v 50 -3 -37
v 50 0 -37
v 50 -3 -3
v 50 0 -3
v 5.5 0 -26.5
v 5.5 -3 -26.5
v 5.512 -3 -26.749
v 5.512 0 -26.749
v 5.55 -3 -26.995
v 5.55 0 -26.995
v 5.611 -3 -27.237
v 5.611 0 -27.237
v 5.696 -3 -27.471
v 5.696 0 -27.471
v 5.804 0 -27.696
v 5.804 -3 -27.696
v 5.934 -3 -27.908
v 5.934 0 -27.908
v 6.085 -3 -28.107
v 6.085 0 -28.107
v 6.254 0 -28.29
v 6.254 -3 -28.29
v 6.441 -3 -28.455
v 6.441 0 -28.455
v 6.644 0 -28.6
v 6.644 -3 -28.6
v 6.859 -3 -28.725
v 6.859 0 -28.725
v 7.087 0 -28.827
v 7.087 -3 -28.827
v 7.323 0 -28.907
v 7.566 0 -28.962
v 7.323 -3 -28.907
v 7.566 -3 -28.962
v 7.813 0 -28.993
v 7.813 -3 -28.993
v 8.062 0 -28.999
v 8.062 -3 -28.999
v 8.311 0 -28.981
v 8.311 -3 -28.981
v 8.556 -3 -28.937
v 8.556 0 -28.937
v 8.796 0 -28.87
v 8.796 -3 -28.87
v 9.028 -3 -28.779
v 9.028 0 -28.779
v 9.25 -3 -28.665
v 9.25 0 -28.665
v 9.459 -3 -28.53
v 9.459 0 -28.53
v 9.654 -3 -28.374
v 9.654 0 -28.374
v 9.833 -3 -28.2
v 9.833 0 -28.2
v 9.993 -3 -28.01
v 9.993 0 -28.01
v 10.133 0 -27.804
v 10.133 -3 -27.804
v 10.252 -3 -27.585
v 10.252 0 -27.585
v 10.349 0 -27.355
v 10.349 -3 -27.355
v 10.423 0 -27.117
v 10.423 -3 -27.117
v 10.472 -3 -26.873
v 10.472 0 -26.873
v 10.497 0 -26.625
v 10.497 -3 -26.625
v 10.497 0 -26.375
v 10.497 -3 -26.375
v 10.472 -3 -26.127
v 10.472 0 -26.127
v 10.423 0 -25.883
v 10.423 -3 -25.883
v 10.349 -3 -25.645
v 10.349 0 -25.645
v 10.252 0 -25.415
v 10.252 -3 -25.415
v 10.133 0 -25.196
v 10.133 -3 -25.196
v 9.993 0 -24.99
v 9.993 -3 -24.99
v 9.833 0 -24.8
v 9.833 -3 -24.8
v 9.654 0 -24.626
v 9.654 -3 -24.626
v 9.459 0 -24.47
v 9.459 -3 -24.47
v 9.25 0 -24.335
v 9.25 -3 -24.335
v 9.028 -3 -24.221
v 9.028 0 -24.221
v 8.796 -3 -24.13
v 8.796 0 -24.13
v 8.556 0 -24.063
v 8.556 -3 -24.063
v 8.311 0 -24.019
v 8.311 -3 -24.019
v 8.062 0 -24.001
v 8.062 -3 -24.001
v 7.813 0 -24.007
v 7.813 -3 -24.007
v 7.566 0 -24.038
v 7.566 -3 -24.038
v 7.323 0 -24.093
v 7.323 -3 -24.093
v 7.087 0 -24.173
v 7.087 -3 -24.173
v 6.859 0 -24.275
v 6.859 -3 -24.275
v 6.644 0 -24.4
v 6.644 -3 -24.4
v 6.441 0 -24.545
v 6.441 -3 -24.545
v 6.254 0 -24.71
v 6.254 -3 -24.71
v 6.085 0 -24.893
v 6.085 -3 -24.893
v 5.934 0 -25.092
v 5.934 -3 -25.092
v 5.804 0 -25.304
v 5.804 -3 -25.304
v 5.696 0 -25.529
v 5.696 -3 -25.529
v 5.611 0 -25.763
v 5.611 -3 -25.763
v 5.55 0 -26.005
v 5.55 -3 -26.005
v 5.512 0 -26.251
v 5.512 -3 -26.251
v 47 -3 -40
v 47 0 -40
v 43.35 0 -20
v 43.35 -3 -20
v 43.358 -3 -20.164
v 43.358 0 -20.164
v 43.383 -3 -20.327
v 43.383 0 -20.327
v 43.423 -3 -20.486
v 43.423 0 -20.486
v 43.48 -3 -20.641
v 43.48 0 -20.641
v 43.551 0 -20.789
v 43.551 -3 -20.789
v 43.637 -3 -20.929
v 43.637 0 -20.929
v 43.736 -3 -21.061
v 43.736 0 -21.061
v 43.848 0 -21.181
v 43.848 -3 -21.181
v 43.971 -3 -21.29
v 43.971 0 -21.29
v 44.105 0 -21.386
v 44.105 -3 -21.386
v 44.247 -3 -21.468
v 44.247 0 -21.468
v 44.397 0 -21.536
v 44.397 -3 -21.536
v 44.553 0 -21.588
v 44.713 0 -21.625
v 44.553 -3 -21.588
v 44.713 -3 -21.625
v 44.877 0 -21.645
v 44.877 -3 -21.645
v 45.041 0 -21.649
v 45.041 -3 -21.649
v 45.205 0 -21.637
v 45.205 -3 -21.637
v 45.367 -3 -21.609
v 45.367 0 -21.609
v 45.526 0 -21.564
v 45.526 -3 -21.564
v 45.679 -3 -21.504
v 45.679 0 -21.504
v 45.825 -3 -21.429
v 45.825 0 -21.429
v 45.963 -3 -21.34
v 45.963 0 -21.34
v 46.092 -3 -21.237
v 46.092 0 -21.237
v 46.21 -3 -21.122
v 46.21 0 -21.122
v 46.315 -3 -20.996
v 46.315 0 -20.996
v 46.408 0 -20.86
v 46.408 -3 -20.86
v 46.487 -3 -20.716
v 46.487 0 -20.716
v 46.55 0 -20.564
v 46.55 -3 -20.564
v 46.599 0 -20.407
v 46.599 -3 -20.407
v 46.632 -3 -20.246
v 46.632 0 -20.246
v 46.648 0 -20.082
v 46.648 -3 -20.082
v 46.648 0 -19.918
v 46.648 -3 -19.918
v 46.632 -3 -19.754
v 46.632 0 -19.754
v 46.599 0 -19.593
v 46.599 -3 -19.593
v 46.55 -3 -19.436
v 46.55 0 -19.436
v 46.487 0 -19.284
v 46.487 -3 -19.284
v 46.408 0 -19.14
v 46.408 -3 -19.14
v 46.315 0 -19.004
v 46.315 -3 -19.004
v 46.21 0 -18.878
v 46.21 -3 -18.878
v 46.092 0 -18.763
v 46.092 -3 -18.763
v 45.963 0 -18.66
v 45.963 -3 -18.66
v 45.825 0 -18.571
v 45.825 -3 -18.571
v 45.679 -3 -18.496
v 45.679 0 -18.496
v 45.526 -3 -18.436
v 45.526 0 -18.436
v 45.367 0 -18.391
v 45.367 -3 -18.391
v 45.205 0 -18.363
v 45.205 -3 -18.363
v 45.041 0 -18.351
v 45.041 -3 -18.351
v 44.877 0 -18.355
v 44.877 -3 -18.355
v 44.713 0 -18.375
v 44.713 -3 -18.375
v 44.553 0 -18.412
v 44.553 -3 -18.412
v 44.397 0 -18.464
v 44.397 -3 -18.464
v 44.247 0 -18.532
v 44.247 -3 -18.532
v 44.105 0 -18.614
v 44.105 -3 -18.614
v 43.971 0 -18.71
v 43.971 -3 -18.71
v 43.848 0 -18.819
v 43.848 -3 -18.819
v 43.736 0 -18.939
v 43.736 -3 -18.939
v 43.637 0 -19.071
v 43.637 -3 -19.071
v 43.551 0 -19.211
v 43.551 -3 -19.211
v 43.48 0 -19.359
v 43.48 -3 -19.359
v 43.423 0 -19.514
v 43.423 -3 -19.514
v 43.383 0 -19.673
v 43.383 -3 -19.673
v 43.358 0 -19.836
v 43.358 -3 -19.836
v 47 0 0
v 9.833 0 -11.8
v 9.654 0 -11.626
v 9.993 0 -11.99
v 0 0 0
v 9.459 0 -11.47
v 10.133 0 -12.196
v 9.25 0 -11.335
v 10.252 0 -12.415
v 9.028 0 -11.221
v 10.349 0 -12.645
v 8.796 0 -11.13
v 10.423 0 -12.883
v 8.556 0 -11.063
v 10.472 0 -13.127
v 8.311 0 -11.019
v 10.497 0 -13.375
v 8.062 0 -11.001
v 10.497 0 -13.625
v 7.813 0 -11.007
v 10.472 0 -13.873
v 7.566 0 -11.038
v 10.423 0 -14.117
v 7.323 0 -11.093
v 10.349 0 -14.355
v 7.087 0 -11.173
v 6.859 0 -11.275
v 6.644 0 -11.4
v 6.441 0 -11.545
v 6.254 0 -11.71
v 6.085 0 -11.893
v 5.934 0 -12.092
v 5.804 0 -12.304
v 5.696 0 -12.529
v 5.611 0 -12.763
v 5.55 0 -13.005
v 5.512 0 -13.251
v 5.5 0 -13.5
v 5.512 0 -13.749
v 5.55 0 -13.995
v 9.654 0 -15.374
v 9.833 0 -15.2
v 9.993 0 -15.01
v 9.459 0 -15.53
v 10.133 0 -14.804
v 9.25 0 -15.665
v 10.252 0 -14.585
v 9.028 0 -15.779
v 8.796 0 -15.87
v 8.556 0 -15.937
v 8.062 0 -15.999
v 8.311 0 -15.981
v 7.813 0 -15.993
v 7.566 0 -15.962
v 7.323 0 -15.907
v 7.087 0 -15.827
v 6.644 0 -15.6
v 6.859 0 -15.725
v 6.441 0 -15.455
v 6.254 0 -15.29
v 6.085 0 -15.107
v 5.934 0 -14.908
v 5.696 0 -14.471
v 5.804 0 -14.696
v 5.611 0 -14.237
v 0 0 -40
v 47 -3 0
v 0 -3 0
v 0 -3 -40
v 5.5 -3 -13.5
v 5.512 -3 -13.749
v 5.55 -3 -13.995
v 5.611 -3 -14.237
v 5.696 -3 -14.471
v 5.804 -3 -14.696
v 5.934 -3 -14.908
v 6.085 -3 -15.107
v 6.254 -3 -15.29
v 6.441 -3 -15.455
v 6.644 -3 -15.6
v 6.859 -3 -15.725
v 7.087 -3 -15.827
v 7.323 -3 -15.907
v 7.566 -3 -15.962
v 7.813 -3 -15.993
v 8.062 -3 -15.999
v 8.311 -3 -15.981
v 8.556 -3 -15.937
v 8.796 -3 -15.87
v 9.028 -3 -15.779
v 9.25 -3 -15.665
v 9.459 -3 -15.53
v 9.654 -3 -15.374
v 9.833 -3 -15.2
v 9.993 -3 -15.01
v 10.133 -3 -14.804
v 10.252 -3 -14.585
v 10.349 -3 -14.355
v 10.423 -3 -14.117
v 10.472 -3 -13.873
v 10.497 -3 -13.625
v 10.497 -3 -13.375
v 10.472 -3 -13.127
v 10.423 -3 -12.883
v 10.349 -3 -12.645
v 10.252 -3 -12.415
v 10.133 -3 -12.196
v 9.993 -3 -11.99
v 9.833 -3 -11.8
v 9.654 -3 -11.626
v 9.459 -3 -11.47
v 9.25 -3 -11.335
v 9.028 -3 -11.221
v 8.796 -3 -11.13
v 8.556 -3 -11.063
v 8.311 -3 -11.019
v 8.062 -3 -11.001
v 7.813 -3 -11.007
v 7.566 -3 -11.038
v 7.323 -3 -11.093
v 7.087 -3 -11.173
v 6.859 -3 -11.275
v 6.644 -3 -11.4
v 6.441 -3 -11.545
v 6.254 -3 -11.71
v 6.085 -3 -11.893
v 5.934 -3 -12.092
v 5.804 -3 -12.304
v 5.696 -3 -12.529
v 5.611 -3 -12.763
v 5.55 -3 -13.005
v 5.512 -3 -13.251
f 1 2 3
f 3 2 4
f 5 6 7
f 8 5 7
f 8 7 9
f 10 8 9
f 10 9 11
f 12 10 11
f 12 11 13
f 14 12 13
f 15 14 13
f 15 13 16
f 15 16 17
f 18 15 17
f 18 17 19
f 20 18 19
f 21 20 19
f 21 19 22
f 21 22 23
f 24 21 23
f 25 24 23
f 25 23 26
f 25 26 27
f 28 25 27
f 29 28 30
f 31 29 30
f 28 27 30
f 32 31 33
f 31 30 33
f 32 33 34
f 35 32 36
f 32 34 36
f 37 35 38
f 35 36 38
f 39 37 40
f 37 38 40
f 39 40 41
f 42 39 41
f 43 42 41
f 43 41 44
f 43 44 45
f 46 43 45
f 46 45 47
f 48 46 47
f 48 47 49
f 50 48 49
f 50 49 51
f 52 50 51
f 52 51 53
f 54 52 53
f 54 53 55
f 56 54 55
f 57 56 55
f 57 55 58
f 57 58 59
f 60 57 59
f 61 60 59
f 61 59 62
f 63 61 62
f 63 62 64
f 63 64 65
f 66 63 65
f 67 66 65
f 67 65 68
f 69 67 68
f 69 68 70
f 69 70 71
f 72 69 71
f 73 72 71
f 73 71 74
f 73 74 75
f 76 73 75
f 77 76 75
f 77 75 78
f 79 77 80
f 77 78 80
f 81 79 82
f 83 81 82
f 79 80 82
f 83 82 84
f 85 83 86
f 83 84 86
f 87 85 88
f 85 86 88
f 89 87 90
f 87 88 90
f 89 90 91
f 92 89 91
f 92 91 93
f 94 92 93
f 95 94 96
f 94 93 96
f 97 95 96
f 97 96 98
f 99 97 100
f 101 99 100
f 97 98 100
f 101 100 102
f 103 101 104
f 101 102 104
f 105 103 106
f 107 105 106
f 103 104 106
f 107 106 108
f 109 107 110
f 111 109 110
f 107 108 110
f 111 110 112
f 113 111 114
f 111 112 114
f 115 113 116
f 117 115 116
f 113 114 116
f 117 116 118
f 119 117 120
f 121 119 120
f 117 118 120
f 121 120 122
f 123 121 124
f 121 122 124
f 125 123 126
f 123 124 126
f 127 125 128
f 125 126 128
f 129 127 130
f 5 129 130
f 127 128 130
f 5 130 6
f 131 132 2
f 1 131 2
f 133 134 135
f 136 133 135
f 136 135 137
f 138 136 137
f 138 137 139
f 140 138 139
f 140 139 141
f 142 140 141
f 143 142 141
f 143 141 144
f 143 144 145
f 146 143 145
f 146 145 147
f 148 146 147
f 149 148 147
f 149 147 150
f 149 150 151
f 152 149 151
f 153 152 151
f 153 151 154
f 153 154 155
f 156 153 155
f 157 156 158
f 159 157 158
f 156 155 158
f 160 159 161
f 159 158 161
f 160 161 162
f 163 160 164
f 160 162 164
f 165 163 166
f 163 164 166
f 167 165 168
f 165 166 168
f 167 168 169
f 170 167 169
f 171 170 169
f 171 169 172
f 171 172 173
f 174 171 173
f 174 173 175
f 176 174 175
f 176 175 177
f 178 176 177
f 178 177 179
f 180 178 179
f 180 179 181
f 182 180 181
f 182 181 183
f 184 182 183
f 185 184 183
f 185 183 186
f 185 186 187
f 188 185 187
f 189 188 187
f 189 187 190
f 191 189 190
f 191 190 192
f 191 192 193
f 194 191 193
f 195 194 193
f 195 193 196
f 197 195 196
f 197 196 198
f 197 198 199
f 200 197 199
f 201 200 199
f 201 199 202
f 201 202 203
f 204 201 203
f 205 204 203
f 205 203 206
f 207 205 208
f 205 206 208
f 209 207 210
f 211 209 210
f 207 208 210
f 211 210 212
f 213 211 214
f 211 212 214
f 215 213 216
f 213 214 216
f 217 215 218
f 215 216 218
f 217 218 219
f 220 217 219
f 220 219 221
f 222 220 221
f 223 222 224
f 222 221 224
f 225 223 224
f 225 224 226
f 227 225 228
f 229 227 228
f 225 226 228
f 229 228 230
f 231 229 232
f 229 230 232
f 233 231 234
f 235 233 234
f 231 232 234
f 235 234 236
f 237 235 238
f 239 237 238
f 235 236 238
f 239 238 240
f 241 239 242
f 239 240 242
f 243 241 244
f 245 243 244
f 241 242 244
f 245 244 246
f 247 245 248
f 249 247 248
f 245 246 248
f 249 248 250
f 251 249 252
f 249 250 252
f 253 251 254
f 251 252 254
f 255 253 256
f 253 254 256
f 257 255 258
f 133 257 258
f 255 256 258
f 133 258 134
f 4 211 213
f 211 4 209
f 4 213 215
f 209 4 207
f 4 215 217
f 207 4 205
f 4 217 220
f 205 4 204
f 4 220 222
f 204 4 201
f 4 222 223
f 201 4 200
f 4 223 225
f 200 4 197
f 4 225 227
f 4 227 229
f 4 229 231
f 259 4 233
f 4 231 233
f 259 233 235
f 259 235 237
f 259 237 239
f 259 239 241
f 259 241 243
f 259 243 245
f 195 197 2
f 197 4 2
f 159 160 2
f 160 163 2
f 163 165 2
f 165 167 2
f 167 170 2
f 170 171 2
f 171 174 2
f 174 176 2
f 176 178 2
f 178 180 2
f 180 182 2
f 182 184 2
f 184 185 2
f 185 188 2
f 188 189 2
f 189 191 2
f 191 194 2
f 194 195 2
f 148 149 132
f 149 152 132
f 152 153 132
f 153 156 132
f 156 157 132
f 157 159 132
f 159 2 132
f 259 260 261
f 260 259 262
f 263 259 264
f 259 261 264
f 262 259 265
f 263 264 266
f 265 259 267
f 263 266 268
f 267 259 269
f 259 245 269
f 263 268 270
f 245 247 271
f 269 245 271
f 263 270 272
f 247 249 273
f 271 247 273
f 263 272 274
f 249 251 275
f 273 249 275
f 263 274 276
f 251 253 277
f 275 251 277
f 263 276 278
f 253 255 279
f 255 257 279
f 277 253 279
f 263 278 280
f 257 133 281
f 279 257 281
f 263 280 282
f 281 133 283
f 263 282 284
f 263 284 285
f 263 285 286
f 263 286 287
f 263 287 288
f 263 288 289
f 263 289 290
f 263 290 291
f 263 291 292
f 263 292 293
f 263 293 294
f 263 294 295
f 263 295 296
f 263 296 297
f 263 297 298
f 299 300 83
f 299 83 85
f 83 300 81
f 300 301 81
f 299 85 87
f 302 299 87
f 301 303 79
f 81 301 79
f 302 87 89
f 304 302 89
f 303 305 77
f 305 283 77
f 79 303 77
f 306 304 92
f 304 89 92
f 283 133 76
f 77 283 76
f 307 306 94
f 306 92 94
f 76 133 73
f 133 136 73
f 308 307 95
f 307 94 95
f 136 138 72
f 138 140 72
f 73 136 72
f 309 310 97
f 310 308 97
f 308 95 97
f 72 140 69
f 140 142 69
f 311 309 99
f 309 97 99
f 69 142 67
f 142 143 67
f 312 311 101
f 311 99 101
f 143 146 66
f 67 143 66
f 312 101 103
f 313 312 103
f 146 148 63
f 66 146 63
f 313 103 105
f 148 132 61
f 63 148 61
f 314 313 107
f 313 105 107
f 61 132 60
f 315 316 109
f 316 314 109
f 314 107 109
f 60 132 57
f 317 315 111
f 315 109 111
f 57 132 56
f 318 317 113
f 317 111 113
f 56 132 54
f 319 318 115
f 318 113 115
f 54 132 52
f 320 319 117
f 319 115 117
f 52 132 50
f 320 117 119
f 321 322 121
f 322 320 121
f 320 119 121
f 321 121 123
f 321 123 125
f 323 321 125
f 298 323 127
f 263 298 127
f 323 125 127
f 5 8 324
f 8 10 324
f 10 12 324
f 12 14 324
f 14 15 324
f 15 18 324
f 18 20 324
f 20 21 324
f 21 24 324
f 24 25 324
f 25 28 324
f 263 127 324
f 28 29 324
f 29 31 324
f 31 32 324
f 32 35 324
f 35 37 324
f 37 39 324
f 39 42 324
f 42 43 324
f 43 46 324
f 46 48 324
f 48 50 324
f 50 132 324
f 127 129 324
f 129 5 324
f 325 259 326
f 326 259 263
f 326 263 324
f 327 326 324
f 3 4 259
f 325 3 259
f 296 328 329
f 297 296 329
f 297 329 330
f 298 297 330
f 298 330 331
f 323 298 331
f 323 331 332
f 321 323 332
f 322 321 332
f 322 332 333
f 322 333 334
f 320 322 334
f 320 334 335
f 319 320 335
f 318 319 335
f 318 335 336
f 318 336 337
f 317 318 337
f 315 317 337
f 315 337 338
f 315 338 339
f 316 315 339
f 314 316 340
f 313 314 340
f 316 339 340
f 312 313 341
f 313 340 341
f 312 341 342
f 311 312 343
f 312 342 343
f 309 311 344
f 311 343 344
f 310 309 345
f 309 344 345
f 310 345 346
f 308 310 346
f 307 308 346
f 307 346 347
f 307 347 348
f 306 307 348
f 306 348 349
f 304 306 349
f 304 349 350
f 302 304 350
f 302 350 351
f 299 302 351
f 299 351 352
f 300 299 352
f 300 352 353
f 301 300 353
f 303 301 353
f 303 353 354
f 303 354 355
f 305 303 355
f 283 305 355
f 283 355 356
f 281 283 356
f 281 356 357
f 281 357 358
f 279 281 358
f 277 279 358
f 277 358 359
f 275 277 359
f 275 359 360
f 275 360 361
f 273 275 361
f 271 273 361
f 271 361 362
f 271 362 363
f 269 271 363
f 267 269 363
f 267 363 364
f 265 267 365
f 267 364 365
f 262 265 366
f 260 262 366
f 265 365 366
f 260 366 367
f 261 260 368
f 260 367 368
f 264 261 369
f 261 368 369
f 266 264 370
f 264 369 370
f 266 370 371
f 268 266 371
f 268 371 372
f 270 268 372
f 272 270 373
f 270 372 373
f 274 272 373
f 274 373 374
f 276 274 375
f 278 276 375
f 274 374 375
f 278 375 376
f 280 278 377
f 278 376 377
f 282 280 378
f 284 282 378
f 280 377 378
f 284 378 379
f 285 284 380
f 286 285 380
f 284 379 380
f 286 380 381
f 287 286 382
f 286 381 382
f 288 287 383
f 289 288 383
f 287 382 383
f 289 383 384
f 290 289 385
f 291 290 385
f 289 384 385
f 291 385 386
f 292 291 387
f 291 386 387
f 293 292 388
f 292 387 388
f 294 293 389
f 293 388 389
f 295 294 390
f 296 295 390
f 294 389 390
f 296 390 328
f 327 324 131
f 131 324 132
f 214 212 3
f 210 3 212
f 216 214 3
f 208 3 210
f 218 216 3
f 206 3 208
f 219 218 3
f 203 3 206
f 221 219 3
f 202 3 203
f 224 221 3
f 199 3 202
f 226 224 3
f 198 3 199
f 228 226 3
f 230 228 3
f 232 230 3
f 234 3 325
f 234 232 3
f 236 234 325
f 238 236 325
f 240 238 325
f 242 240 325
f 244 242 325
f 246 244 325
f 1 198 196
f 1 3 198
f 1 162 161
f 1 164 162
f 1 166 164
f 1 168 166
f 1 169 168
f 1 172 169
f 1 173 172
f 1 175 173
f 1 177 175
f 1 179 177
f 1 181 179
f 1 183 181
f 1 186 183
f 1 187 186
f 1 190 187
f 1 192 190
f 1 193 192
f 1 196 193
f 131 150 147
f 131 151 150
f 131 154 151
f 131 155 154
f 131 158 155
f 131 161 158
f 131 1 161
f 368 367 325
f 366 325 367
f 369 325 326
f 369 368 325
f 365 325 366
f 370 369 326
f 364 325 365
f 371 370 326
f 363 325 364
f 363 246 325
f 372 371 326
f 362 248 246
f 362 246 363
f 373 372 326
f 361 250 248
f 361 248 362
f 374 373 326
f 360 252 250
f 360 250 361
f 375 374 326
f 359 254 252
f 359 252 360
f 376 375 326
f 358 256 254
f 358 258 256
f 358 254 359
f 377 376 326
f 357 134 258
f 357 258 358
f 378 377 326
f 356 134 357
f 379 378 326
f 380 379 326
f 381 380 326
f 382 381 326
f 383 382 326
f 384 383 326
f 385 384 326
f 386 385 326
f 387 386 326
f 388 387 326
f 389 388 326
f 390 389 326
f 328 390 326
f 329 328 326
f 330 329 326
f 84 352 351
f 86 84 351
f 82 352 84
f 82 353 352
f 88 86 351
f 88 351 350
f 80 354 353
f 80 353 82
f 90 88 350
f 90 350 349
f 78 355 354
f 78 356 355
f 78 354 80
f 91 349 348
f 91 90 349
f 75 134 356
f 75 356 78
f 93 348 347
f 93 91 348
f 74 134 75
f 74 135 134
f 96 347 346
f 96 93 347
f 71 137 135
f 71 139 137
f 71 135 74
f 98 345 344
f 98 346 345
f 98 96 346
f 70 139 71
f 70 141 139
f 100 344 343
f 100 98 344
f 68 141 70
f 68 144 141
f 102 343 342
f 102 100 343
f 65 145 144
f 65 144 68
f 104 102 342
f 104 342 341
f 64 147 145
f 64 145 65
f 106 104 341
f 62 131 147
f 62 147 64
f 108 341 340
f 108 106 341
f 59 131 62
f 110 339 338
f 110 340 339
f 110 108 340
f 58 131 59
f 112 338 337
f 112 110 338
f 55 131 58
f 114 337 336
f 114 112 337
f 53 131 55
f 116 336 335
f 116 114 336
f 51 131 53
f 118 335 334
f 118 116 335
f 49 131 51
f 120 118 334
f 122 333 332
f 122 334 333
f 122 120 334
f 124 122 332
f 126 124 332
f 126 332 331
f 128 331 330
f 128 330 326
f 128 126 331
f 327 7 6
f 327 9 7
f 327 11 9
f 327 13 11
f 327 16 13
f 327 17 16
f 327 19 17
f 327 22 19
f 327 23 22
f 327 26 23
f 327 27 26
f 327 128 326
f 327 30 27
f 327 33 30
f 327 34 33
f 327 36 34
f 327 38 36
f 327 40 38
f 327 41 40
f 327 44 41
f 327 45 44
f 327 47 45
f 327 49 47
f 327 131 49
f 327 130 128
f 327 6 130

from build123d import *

# Parameters (mm, degrees)
BOSS_EXTRUDE1_DEPTH   = 3
M4X0_7_TAPPED_HOLE1_D = 3.3
M6X1_0_TAPPED_HOLE2_D = 5


with BuildPart() as part:
    # Sketch1 → Boss-Extrude1 (new body)
    with BuildSketch(Plane(origin=(0, 0, 0), x_dir=(1, 0, 0), z_dir=(0, 1, 0))):
        Polygon((47, 40), (50, 37), (50, 3), (47, 0), (0, 0), (0, 40), align=None)
    extrude(amount=-BOSS_EXTRUDE1_DEPTH)

    # M4x0.7 Tapped Hole1 (through all)
    with Locations(Plane(origin=(0, 0, 0), x_dir=(1, 0, 0), z_dir=(0, 1, 0))):
        with Locations((45, 20)):
            Hole(M4X0_7_TAPPED_HOLE1_D / 2)

    # M6x1.0 Tapped Hole2 (through all)
    with Locations(Plane(origin=(0, 0, 0), x_dir=(1, 0, 0), z_dir=(0, 1, 0))):
        with Locations((8, 13.5), (8, 26.5)):
            Hole(M6X1_0_TAPPED_HOLE2_D / 2)


solid = part.part
